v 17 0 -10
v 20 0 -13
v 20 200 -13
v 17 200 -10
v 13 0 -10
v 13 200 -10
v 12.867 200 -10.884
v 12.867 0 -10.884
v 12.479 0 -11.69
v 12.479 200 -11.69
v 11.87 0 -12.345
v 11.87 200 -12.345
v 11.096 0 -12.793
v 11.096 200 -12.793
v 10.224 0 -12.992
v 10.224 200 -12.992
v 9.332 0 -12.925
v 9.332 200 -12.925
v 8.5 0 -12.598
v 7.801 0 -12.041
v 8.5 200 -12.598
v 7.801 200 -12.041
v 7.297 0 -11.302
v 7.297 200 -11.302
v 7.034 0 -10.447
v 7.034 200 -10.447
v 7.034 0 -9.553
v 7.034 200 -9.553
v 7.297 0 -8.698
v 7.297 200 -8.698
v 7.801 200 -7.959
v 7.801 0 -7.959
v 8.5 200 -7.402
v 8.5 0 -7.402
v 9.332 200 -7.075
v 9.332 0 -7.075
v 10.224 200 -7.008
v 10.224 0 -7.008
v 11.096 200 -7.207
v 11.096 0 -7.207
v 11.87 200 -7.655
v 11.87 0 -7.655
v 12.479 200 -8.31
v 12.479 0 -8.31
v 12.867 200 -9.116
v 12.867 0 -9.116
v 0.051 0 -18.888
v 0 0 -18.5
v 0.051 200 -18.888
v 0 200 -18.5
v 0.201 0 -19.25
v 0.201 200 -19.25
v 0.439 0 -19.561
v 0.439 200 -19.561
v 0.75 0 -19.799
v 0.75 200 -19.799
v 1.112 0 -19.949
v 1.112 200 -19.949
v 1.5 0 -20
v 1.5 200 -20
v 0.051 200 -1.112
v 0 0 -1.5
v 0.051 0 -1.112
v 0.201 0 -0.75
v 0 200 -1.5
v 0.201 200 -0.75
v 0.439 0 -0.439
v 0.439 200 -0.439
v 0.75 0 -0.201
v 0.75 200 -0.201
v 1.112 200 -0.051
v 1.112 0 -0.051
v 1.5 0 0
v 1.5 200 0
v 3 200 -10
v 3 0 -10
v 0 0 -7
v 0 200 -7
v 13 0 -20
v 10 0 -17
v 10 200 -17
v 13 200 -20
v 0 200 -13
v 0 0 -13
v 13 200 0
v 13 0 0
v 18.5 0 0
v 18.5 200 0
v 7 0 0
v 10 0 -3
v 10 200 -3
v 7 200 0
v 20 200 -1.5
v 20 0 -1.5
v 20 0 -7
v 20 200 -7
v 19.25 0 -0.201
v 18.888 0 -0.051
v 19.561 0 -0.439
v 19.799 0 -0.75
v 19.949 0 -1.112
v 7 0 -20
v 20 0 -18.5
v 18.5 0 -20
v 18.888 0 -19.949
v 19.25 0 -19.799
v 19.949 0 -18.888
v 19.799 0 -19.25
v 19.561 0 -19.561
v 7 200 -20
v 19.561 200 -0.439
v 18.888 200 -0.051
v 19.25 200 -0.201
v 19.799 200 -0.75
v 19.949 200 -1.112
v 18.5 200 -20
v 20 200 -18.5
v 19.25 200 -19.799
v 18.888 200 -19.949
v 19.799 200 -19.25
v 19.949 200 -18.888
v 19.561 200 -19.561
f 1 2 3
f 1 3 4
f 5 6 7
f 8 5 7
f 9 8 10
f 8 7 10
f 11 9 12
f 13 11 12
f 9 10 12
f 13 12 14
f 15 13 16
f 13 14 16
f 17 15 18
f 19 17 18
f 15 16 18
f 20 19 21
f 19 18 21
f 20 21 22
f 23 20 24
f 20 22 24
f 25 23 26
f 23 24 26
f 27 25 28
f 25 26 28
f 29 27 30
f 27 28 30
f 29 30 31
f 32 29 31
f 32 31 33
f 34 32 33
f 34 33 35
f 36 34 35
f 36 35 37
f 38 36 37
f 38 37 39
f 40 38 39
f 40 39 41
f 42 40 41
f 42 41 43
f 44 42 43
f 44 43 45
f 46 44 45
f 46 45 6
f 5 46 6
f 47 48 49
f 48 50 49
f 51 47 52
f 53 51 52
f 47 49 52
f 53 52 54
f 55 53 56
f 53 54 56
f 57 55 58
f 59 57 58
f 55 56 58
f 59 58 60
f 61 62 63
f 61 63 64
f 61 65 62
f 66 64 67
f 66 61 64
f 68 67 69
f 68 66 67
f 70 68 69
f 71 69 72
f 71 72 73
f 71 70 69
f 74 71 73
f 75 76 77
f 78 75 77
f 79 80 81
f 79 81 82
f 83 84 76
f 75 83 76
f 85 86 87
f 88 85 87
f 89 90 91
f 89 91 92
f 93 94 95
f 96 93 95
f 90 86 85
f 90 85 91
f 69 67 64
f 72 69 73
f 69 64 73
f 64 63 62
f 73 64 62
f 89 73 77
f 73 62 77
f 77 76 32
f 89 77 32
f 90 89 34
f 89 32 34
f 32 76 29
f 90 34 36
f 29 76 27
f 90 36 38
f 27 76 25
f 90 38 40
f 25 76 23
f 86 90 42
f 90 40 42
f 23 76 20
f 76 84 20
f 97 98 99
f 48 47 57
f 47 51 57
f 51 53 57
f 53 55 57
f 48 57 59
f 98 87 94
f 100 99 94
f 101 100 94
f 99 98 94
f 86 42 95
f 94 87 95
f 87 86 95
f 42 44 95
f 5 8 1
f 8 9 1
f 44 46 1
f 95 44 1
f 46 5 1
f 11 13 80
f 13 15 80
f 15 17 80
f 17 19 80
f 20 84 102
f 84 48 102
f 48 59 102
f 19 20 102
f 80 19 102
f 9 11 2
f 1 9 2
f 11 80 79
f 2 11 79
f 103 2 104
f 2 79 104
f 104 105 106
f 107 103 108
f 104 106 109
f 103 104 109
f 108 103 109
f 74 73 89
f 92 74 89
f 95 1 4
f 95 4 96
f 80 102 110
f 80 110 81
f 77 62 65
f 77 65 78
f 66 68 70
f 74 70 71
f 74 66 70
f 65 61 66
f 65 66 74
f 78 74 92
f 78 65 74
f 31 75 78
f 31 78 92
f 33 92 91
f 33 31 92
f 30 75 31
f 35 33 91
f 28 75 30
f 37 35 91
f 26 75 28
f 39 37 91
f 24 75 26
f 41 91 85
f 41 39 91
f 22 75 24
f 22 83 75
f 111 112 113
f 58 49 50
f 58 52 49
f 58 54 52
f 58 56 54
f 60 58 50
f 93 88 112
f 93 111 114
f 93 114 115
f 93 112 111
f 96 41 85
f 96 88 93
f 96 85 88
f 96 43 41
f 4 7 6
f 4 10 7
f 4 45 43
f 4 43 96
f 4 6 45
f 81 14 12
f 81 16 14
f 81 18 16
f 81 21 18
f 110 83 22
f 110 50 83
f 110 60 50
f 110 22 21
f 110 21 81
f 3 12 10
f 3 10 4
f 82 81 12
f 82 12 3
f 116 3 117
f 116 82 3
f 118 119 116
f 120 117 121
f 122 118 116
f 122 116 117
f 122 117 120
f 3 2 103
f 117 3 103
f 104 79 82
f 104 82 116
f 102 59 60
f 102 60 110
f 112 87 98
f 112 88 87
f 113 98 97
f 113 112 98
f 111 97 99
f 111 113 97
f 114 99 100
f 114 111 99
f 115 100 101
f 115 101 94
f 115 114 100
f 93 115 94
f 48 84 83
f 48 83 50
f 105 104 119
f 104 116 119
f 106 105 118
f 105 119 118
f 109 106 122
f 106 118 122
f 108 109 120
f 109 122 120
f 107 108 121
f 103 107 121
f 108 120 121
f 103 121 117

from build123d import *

# Parameters (mm, degrees)
SKIZZE1_W                       = 20
SKIZZE1_H                       = 20
AUFSATZ_LINEAR_AUSTRAGEN1_DEPTH = 200
SCHNITT_LINEAR_AUSTRAGEN1_DEPTH = 201
SKIZZE3_R                       = 3
SCHNITT_LINEAR_AUSTRAGEN2_DEPTH = 201
FILLET1_R                       = 1.5


with BuildPart() as part:
    # Skizze1 → Aufsatz-Linear austragen1 (new body)
    with BuildSketch(Plane(origin=(0, 0, 0), x_dir=(1, 0, 0), z_dir=(0, 1, 0))):
        with Locations((10, 10)):
            Rectangle(SKIZZE1_W, SKIZZE1_H)
    extrude(amount=AUFSATZ_LINEAR_AUSTRAGEN1_DEPTH)

    # Skizze2 → Schnitt-Linear austragen1 (cut, through all)
    with BuildSketch(Plane(origin=(0, 200, 0), x_dir=(1, 0, 0), z_dir=(0, 1, 0))):
        Polygon((7, 20), (10, 17), (13, 20), align=None)
        Polygon((20, 13), (17, 10), (20, 7), align=None)
        Polygon((0, 7), (0, 13), (3, 10), align=None)
        Polygon((7, 0), (13, 0), (10, 3), align=None)
    extrude(amount=-SCHNITT_LINEAR_AUSTRAGEN1_DEPTH, mode=Mode.SUBTRACT)

    # Skizze3 → Schnitt-Linear austragen2 (cut, through all)
    with BuildSketch(Plane(origin=(0, 200, 0), x_dir=(1, 0, 0), z_dir=(0, 1, 0))):
        with Locations((10, 10)):
            Circle(SKIZZE3_R)
    extrude(amount=-SCHNITT_LINEAR_AUSTRAGEN2_DEPTH, mode=Mode.SUBTRACT)

    # Fillet1
    fillet1_edges = [part.edges().sort_by_distance(p)[0] for p in [
        (0, 100, -20),
        (20, 100, -20),
        (20, 100, 0),
        (0, 100, 0),
    ]]
    fillet(fillet1_edges, radius=FILLET1_R)


solid = part.part
